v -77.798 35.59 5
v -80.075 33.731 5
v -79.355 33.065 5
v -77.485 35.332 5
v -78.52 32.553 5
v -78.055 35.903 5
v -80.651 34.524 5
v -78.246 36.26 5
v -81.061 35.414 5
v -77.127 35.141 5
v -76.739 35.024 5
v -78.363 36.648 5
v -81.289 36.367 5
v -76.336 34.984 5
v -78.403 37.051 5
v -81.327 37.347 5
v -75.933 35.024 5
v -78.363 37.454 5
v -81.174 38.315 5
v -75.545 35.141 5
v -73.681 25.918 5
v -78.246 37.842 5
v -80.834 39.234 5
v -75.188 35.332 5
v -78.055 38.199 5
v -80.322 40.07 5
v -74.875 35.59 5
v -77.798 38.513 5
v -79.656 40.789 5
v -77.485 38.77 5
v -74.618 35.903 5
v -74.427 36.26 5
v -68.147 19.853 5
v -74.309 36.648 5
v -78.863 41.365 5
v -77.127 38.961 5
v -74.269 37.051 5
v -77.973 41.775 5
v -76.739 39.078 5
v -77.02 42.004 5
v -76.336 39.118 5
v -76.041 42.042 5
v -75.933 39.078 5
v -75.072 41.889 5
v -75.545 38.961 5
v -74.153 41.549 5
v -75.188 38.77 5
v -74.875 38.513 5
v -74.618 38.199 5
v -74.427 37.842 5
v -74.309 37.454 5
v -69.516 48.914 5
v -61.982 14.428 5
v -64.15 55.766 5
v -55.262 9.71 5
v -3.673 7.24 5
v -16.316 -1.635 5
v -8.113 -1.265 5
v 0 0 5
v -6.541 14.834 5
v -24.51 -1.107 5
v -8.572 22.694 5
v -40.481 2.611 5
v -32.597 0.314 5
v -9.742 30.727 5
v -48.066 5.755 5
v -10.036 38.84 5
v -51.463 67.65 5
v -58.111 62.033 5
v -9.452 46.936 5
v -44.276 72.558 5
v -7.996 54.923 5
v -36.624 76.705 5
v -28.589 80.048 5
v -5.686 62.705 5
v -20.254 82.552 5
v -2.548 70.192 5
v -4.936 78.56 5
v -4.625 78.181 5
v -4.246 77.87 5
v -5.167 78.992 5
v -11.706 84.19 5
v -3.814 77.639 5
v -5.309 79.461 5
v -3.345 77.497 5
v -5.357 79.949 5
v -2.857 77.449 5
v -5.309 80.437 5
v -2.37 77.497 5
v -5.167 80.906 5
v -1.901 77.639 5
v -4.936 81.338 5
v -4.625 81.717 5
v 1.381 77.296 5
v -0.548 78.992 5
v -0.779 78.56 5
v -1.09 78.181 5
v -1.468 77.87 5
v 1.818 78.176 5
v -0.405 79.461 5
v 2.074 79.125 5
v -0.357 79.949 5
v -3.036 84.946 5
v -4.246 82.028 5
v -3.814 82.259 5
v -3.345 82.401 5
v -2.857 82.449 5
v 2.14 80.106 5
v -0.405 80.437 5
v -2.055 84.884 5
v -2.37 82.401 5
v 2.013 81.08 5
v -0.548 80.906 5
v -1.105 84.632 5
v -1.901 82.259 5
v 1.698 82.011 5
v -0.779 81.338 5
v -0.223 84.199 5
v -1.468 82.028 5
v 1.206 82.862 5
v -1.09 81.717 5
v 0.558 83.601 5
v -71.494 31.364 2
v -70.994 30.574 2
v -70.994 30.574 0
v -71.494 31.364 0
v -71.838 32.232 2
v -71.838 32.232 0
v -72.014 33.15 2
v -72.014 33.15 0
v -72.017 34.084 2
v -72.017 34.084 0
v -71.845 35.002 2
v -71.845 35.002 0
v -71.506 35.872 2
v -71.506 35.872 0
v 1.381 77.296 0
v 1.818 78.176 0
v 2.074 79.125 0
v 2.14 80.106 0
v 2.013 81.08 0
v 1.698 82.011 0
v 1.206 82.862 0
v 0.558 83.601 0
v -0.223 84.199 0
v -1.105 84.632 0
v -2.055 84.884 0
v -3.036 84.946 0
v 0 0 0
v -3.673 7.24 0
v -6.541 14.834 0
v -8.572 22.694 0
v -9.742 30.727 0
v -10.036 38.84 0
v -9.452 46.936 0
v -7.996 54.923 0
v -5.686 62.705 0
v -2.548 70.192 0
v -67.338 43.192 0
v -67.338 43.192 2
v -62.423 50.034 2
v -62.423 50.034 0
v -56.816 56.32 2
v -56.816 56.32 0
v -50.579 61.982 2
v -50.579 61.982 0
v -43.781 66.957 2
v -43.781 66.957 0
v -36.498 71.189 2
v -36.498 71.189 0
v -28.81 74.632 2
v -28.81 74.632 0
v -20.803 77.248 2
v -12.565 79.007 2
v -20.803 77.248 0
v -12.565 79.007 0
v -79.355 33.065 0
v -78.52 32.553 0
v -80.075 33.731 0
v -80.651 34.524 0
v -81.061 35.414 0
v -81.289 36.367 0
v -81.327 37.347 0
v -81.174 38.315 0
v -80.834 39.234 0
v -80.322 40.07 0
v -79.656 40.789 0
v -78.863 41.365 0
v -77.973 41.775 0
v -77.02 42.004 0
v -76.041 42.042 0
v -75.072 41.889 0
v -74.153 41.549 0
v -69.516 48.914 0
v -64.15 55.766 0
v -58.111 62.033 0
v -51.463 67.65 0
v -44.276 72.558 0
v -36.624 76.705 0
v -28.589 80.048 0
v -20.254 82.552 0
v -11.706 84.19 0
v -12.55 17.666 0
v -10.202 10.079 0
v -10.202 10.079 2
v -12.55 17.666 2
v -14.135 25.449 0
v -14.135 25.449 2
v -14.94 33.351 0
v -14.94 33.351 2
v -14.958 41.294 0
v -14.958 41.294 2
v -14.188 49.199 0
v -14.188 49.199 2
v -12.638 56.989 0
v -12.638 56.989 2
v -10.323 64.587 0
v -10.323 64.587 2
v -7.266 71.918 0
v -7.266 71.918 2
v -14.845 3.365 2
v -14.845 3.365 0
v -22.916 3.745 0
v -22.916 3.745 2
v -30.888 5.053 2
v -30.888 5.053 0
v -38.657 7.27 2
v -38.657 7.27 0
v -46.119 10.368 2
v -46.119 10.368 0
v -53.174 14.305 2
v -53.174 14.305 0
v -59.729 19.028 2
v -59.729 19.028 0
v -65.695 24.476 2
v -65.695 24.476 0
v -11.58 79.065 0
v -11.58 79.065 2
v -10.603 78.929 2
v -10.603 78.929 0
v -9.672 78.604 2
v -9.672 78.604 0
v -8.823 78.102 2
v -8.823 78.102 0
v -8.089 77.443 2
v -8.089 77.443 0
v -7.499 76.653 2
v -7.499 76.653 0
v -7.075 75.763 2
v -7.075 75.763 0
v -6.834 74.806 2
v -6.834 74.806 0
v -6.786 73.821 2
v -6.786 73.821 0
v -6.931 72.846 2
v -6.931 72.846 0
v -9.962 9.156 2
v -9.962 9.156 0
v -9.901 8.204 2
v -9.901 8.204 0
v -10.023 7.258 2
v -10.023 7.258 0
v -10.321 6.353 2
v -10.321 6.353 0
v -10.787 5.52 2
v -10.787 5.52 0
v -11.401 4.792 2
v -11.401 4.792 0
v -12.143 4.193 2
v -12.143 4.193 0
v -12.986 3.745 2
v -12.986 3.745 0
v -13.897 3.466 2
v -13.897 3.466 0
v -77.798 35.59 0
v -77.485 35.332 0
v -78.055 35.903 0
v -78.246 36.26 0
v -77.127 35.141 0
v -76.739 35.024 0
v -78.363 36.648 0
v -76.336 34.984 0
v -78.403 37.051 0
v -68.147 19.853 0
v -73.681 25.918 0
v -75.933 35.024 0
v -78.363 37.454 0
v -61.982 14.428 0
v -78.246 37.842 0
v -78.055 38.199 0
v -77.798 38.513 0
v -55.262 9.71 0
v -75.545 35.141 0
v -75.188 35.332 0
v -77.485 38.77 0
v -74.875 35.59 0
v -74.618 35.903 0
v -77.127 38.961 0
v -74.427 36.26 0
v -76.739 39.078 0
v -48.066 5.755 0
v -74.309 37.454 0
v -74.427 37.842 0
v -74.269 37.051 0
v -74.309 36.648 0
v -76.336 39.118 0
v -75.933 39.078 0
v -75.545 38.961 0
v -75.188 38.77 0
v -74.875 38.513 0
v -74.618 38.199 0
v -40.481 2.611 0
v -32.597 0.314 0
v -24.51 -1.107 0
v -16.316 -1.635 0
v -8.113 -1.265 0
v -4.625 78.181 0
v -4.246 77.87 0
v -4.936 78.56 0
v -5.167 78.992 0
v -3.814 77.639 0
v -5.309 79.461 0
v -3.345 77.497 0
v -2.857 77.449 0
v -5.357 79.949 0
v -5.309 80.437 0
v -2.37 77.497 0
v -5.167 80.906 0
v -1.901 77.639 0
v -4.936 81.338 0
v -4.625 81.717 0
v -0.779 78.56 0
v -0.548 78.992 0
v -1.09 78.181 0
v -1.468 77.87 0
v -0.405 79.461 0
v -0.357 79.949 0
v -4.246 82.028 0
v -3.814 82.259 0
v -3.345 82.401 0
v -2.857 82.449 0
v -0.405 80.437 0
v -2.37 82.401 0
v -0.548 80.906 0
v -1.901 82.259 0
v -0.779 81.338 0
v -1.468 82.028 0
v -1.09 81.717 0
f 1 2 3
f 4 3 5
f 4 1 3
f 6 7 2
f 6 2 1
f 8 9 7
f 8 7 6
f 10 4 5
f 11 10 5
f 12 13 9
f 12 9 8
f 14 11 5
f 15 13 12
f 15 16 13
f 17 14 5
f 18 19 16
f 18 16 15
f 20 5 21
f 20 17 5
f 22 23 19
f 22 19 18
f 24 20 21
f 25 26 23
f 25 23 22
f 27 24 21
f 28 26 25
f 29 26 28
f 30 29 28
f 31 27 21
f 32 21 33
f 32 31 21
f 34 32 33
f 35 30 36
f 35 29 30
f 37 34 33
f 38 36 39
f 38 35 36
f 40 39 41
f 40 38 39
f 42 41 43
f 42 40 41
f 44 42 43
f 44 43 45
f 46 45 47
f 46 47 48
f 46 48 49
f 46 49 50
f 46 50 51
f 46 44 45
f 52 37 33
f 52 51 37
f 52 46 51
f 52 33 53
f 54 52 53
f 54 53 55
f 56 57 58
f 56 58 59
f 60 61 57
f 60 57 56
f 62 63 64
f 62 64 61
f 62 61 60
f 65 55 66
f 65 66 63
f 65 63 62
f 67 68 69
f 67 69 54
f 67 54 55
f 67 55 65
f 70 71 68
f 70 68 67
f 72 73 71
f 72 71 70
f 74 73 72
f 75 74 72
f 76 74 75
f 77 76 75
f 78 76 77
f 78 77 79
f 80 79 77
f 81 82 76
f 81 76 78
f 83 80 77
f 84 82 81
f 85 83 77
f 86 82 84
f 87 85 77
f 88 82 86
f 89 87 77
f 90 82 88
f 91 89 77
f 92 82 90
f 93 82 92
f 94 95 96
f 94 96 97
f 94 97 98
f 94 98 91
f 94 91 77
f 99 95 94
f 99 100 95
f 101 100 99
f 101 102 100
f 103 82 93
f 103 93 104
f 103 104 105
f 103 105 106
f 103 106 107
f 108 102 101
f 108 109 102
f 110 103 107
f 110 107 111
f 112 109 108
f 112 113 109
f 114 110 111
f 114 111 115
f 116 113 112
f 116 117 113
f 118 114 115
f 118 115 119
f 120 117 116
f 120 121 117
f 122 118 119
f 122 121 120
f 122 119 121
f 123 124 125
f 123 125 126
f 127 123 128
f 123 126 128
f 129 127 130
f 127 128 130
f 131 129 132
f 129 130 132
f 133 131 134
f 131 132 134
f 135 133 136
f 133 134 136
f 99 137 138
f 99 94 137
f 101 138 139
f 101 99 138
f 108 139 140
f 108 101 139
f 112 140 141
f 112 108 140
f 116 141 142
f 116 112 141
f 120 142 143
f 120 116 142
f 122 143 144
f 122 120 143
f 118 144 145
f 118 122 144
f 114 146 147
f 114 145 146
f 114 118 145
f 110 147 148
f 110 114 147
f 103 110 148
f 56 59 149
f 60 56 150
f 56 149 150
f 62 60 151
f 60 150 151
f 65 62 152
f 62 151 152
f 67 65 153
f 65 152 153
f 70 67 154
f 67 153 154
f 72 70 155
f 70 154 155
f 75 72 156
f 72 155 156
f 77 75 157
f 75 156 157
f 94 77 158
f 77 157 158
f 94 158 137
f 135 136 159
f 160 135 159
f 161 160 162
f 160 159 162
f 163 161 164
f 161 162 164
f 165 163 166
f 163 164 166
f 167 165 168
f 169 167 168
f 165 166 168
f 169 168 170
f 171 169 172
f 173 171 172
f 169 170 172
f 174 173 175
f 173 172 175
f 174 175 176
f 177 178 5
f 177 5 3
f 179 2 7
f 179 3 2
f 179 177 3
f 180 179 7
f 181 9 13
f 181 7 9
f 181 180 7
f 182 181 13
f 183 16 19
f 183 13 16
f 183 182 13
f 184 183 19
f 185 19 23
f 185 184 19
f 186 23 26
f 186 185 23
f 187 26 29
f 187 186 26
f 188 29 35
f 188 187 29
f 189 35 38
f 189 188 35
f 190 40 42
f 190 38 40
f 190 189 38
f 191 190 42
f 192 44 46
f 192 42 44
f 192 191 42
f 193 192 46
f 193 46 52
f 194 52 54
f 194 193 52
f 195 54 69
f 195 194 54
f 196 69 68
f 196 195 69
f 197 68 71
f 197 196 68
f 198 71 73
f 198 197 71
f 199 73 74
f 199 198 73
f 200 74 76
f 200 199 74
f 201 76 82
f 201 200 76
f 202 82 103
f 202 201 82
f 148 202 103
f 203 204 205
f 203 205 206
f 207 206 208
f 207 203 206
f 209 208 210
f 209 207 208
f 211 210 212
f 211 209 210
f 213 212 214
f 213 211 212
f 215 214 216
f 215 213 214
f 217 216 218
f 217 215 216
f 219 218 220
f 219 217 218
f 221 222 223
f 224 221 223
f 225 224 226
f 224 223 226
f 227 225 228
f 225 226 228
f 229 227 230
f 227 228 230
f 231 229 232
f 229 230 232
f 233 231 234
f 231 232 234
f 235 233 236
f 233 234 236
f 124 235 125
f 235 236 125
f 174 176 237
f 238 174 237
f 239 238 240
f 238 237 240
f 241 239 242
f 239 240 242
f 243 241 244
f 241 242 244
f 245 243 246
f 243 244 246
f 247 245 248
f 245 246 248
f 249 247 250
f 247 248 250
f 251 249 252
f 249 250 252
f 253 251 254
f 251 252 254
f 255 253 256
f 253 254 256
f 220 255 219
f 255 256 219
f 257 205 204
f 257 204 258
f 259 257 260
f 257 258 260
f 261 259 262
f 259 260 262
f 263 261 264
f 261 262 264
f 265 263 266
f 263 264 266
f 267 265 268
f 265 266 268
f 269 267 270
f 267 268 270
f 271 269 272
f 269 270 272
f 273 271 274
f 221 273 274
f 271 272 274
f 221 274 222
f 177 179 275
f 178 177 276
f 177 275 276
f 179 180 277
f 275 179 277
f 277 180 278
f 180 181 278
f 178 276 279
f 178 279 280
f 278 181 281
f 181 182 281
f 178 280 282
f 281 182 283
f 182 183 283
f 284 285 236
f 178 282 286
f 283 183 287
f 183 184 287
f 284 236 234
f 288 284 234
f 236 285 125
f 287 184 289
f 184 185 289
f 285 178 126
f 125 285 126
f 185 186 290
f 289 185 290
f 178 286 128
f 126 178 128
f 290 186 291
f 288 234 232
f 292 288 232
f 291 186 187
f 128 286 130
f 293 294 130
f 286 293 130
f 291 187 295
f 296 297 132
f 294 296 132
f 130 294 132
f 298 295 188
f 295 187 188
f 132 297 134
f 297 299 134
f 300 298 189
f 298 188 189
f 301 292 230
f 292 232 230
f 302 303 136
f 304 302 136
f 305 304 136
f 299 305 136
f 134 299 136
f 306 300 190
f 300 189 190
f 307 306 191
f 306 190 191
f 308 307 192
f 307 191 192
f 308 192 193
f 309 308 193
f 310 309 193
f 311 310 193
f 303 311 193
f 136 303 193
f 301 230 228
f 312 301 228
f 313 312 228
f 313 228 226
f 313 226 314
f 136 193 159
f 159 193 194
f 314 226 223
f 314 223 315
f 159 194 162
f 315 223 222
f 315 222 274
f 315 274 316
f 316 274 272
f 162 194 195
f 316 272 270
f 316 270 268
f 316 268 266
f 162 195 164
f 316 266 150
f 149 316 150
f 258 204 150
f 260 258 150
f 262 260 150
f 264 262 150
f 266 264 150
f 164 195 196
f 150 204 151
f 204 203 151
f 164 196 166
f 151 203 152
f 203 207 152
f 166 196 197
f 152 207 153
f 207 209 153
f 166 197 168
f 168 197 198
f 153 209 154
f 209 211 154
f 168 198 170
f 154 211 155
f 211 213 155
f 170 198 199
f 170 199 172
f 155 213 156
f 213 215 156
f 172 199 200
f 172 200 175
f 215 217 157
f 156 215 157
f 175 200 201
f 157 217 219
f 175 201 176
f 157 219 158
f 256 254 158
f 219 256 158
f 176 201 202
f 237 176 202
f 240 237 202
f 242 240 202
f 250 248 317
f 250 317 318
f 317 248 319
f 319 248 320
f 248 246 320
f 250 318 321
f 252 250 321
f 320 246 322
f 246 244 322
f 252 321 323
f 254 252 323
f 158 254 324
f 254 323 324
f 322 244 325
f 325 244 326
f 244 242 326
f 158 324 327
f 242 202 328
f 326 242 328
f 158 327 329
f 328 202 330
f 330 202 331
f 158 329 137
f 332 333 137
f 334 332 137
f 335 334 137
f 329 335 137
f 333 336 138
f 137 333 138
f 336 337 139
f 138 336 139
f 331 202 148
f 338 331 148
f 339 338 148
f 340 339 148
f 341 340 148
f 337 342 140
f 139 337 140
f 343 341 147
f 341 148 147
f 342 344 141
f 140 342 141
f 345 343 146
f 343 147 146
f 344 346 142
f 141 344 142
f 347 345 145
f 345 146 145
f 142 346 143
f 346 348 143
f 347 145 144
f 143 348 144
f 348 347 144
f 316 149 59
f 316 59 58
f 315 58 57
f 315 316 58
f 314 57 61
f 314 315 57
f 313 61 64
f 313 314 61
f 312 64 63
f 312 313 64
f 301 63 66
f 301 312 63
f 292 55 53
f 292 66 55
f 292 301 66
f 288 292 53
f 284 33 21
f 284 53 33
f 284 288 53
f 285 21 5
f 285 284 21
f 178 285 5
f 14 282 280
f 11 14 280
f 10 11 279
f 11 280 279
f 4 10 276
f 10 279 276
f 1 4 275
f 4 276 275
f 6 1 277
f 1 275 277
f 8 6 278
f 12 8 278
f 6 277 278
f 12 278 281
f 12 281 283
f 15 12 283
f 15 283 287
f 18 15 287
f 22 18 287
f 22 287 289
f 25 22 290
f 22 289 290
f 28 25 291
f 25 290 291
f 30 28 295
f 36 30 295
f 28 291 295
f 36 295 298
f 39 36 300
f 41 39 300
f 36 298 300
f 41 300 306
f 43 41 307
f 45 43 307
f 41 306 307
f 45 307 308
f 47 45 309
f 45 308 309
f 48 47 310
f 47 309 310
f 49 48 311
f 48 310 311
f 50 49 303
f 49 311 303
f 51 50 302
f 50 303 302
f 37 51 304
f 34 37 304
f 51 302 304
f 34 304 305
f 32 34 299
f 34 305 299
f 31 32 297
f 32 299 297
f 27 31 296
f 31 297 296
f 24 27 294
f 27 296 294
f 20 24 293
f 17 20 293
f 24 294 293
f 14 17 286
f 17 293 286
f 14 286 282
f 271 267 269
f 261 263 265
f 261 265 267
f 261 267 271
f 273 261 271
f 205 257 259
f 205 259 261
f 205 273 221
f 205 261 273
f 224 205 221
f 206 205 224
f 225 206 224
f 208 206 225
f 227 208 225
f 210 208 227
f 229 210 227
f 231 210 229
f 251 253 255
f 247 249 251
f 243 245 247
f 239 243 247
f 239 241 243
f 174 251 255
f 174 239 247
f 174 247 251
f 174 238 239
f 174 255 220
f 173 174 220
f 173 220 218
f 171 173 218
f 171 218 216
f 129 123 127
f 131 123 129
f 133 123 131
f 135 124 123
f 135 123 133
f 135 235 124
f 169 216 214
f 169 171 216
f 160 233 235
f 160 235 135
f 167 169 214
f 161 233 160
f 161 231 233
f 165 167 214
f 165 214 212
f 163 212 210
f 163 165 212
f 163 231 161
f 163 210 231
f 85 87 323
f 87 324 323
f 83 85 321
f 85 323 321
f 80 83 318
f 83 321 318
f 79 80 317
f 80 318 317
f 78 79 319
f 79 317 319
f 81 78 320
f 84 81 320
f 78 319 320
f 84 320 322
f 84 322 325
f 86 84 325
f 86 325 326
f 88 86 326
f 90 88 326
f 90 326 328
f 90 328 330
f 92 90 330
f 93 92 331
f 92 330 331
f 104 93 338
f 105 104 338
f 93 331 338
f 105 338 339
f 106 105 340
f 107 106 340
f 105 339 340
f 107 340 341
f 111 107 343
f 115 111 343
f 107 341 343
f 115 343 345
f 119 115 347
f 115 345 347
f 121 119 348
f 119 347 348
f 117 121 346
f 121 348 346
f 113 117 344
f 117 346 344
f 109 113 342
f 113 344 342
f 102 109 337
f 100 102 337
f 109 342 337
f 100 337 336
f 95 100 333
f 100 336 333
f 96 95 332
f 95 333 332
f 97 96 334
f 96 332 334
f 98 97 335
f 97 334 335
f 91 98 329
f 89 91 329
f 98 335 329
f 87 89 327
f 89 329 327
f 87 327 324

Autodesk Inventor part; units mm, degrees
ref_plane "YZ Plane" through (0, 0, 0) normal (1, 0, 0) x (0, 1, 0)
ref_plane "XZ Plane" through (0, 0, 0) normal (0, 1, 0) x (-1, 0, 0)
ref_plane "XY Plane" through (0, 0, 0) normal (0, 0, 1) x (1, 0, 0)
sketch "Sketch1" plane through (0, 0, 0) normal (0, 0, 1) x (1, 0, 0)
  circle A0 centre (0, 0) radius 75 construction
  arc A1 (-78.5195, 32.5529) -> (0, 0) centre (-15.5934, 73.3611) ccw
  line L0 (-15.5934, 73.3611) -> (-78.5195, 32.5529) construction
  line L1 (-15.5934, 73.3611) -> (0, 0) construction
  line L2 (0, 0) -> (64.9519, 37.5) construction
  arc A2 (6.6958, 84.7359) -> (0, 0) centre (64.9519, 37.5) ccw
  line L3 (64.9519, 37.5) -> (6.6958, 84.7359) construction
  line L4 (64.9519, 37.5) -> (0, 0) construction
  line L5 (0, 0) -> (0, 75) construction
  circle A3 centre (0, 0) radius 85 construction
  arc A4 (6.6958, 84.7359) -> (-78.5195, 32.5529) centre (0, 0) ccw
  arc A5 (-74.153, 41.5492) -> (-78.5195, 32.5529) centre (-76.3362, 37.0511) ccw
  line L6 (-76.3362, 37.0511) -> (-78.5195, 32.5529) construction
  line L7 (-76.3362, 37.0511) -> (-74.153, 41.5492) construction
  point P0 (0, 0)
  dimension "d1" = 72
  dimension "d4" = 60
  dimension "d21" = 170
  dimension "d39" = 5
  dimension "d40" = 180
extrude "Extrusion1" add sketch "Sketch1" along normal blind 5
sketch "Sketch3" plane through (0, 0, 5) normal (0, 0, 1) x (1, 0, 0)
  circle A0 centre (0, 0) radius 80 construction
  circle A1 centre (64.9519, 37.5) radius 75 projected
  circle A2 centre (64.9519, 37.5) radius 80 construction
  point P0 (0, 0)
  point P1 (-2.8573, 79.949)
  dimension "d25" = 160
  dimension "d26" = 160
hole "Hole2" at (-2.8573, 79.949, 5) direction (0, 0, -1) diameter 5 end through all
sketch "Sketch4" plane through (0, 0, 5) normal (0, 0, 1) x (1, 0, 0)
  circle A0 centre (-2.8573, 79.949) radius 2.5 projected
  arc A1 (-78.5195, 32.5529) -> (0, 0) centre (-15.5934, 73.3611) ccw projected
  arc A2 (6.6958, 84.7359) -> (1.3808, 77.2959) centre (64.9519, 37.5) ccw
  arc A3 (6.6958, 84.7359) -> (-3.0359, 84.9458) centre (0, 0) ccw
  arc A4 (6.6958, 84.7359) -> (0, 0) centre (64.9519, 37.5) ccw projected
  arc A5 (6.6958, 84.7359) -> (-78.5195, 32.5529) centre (0, 0) ccw projected
  circle A6 centre (-2.8573, 79.949) radius 5
extrude "Extrusion2" cut sketch "Sketch4" against normal blind 10 contours A3 A2 A6
sketch "Sketch5" plane through (0, 0, 5) normal (0, 0, 1) x (1, 0, 0)
  arc A0 (1.3808, 77.2959) -> (-3.0359, 84.9458) centre (-2.8573, 79.949) ccw projected
  arc A1 (-3.0359, 84.9458) -> (-74.153, 41.5492) centre (0, 0) ccw projected
  arc A2 (-74.153, 41.5492) -> (-78.5195, 32.5529) centre (-76.3362, 37.0511) ccw projected
  arc A3 (-78.5195, 32.5529) -> (0, 0) centre (-15.5934, 73.3611) ccw projected
  arc A4 (1.3808, 77.2959) -> (0, 0) centre (64.9519, 37.5) ccw projected
  circle A5 centre (-2.8573, 79.949) radius 2.5 projected
  point P0 (0, 0)
hole "Hole3" at (-76.3362, 37.0511, 5) direction (0, 0, -1) diameter 4.134 end through all thread size "M5x0.8" class "6H" standard "ANSI Metric M Profile"
sketch "Sketch7" plane through (0, 0, 0) normal (0, 0, -1) x (-1, 0, 0)
  circle A0 centre (76.3362, 37.0511) radius 2.067 projected
  arc A1 (3.0359, 84.9458) -> (-1.3808, 77.2959) centre (2.8573, 79.949) ccw projected
  arc A2 (0, 0) -> (-1.3808, 77.2959) centre (-64.9519, 37.5) ccw projected
  arc A3 (0, 0) -> (78.5195, 32.5529) centre (15.5934, 73.3611) ccw projected
  arc A4 (78.5195, 32.5529) -> (74.153, 41.5492) centre (76.3362, 37.0511) ccw projected
  arc A5 (74.153, 41.5492) -> (3.0359, 84.9458) centre (0, 0) ccw projected
  circle A6 centre (2.8573, 79.949) radius 2.5 projected
  arc A7 (71.5064, 35.8724) -> (12.5647, 79.0071) centre (0, 0) ccw
  arc A8 (14.8454, 3.3651) -> (70.9945, 30.5742) centre (15.5934, 73.3611) ccw
  arc A9 (10.2017, 10.0786) -> (7.2658, 71.9181) centre (-64.9519, 37.5) ccw
  arc A10 (10.2017, 10.0786) -> (14.8454, 3.3651) centre (14.8988, 8.3648) ccw
  arc A11 (12.5647, 79.0071) -> (7.2658, 71.9181) centre (11.7794, 74.0692) ccw
  arc A12 (70.9945, 30.5742) -> (71.5064, 35.8724) centre (67.0373, 33.6304) ccw
  point P0 (0, 0)
  dimension "d51" = 5
  dimension "d55" = 5
extrude "Extrusion4" cut sketch "Sketch7" against normal blind 2 contours A12 A8 A10 A9 A11 A7
properties part number "blad"
